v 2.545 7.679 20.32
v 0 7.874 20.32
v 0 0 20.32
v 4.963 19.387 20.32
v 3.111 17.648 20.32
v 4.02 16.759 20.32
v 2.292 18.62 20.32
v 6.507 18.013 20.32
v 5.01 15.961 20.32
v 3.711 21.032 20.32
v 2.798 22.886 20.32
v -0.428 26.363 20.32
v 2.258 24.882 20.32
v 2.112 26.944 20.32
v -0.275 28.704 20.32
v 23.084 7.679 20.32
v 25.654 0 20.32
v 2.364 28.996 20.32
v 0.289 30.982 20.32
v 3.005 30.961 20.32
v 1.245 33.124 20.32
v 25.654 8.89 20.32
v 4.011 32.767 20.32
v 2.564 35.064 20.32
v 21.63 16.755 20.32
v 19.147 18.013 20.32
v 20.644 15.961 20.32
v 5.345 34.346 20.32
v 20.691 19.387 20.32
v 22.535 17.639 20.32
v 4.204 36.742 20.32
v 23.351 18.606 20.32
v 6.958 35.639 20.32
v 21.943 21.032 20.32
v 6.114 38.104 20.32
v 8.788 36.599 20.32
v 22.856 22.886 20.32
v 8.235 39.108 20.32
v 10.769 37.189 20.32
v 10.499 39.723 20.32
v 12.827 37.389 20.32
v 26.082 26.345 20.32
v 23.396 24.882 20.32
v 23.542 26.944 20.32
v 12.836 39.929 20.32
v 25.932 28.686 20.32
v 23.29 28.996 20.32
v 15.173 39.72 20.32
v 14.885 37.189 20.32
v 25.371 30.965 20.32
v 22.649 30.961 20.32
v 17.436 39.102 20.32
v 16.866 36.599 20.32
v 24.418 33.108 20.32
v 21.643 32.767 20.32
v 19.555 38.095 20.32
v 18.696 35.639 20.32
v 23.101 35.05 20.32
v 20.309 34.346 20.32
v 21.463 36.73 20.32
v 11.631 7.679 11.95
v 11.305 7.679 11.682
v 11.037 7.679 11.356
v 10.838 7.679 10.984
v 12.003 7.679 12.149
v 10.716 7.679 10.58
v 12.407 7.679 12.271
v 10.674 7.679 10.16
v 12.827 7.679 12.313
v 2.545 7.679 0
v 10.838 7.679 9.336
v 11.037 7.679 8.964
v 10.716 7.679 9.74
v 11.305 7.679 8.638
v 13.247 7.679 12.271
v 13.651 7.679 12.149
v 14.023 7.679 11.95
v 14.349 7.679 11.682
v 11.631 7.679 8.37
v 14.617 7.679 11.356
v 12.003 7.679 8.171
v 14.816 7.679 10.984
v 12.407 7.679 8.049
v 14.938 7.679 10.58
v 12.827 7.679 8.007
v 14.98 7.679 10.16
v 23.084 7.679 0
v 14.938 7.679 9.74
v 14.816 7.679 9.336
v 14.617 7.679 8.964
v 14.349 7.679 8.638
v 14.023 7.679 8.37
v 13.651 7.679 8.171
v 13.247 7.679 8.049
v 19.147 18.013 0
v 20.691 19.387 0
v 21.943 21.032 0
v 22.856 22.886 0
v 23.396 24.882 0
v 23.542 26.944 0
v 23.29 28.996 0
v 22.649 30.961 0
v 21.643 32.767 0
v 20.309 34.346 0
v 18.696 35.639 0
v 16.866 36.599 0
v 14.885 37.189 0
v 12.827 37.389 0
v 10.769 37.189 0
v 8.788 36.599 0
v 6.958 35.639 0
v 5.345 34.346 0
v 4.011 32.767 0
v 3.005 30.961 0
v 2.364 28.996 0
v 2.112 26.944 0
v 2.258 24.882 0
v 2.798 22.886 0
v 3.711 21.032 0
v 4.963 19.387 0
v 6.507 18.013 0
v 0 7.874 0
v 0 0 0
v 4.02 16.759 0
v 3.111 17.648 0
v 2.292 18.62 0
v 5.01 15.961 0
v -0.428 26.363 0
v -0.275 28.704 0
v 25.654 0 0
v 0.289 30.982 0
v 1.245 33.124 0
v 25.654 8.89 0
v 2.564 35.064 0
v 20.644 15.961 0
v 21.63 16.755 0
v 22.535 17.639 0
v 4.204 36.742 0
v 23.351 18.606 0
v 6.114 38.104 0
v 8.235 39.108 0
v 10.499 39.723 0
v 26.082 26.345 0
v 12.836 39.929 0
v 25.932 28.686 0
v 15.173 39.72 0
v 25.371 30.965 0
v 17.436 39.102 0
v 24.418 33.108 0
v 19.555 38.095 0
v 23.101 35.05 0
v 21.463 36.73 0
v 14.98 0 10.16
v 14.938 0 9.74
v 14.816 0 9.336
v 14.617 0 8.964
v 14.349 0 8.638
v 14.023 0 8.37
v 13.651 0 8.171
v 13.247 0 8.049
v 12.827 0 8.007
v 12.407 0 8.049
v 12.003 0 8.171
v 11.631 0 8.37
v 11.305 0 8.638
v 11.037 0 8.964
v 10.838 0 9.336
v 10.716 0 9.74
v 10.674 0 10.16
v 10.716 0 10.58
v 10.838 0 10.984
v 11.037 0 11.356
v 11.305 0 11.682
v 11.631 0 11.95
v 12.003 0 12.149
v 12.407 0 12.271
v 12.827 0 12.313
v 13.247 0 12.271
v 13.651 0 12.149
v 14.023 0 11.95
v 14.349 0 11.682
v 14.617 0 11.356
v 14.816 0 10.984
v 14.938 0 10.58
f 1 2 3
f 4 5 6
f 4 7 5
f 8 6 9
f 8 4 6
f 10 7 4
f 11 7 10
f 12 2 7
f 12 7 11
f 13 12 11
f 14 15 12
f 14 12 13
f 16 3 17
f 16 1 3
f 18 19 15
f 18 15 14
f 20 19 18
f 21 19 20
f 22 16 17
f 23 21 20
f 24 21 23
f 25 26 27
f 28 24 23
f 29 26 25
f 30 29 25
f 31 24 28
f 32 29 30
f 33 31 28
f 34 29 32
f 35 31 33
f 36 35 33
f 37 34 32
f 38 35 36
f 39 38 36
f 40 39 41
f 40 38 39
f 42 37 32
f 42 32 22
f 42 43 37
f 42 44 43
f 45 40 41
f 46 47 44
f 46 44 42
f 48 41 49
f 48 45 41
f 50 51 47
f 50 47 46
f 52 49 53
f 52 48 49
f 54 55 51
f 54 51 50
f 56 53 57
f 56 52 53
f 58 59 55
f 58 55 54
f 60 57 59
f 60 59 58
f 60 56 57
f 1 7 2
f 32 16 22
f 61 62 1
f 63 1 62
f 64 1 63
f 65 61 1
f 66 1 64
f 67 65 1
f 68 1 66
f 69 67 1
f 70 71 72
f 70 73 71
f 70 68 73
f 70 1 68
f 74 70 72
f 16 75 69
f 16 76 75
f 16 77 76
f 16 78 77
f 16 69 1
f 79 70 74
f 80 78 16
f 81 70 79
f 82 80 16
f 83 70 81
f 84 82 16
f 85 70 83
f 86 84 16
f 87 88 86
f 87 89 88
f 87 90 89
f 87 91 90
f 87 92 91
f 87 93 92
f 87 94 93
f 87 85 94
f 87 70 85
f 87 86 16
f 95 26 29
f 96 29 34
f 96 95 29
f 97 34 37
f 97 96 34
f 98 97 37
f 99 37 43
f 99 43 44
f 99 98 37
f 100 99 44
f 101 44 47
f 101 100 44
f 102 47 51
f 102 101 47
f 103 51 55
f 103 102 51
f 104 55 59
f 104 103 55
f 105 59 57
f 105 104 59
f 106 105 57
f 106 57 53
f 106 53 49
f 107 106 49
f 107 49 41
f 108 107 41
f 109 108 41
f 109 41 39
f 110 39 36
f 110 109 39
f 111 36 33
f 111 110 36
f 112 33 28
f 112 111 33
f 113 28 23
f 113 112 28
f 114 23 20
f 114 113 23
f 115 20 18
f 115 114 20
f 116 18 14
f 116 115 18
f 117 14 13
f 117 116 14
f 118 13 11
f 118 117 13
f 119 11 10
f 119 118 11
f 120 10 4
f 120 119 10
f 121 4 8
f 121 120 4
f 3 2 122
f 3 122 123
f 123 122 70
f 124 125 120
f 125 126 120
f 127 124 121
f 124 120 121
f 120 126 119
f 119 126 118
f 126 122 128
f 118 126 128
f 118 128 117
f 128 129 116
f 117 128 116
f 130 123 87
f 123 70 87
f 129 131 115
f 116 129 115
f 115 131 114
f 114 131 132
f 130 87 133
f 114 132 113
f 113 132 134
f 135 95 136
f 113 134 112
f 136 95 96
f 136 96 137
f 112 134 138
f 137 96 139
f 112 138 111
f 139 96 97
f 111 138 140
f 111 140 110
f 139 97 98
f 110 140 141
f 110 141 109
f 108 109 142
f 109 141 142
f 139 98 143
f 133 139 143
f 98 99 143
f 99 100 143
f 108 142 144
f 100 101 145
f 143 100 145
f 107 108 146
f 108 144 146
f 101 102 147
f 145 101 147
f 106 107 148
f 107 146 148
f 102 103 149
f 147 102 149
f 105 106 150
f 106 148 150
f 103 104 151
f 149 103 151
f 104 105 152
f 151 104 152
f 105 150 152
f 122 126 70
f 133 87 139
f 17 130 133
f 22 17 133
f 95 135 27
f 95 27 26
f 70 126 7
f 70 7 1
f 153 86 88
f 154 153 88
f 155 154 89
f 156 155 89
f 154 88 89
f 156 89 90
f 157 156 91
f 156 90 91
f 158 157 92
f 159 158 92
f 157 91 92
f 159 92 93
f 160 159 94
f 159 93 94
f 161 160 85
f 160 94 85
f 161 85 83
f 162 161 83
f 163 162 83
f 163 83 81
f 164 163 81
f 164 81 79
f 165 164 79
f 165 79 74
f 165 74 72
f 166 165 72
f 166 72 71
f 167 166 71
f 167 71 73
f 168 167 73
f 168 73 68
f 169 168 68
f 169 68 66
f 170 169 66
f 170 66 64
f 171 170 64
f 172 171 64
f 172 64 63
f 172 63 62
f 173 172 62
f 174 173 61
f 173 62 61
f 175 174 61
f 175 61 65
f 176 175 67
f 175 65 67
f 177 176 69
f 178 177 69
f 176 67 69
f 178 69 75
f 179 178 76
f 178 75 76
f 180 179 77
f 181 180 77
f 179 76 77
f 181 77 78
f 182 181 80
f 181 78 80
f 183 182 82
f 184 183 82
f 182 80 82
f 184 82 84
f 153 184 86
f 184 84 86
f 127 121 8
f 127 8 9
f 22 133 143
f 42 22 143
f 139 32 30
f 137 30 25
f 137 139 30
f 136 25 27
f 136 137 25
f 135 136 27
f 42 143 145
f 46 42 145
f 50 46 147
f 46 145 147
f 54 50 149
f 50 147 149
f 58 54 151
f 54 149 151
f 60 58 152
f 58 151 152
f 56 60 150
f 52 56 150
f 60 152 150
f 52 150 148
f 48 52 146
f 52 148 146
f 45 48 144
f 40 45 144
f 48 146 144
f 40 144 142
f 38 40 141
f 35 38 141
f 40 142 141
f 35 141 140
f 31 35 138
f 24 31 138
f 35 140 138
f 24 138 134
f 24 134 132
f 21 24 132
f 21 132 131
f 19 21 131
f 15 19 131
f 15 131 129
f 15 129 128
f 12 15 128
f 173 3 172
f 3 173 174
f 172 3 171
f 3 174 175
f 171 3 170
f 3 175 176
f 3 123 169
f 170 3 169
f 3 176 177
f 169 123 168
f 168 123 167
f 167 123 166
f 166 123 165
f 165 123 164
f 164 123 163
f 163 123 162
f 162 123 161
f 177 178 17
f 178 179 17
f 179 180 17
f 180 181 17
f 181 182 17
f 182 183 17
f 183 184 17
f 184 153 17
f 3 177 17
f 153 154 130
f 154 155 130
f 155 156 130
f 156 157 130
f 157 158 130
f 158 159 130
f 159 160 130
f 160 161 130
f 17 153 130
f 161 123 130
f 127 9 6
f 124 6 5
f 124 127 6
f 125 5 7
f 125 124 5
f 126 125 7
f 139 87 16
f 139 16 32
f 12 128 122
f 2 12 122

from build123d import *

# Parameters (mm, degrees)
BOSS_EXTRUDE1_DEPTH       = 20.32
F_8_CLEARANCE_HOLE1_D     = 4.3053
F_8_CLEARANCE_HOLE1_DEPTH = 7.679166788


with BuildPart() as part:
    # Sketch1 → Boss-Extrude1 (new body)
    with BuildSketch(Plane.XY):
        with BuildLine():
            Line((0, 0), (25.654, 0))
            Line((25.654, 0), (25.654, 8.89))
            Line((25.654, 8.89), (26.081819356, 26.345128821))
            ThreePointArc((26.081819356, 26.345128821), (12.835928023, 39.928796994), (-0.42824485, 26.362979796))
            Line((-0.42824485, 26.362979796), (0, 7.874))
            Line((0, 7.874), (0, 0))
        make_face()
        with BuildLine():
            Line((2.545194005, 7.679166788), (23.083560079, 7.679166788))
            Line((23.083560079, 7.679166788), (23.351364853, 18.605663581))
            ThreePointArc((23.351364853, 18.605663581), (22.092748432, 17.18624107), (20.64444443, 15.960969231))
            Line((20.64444443, 15.960969231), (19.146849712, 18.012507692))
            ThreePointArc((19.146849712, 18.012507692), (12.827, 37.3888), (6.507150288, 18.012507692))
            Line((6.507150288, 18.012507692), (5.00955557, 15.960969231))
            ThreePointArc((5.00955557, 15.960969231), (3.55486763, 17.192482458), (2.291784196, 18.619844386))
            Line((2.291784196, 18.619844386), (2.545194005, 7.679166788))
        make_face(mode=Mode.SUBTRACT)
    extrude(amount=BOSS_EXTRUDE1_DEPTH)

    # #8 Clearance Hole1
    with Locations(Plane(origin=(0, 0, 0), x_dir=(-1, 0, 0), z_dir=(0, -1, 0))):
        with Locations((-12.827, -10.16)):
            Hole(F_8_CLEARANCE_HOLE1_D / 2, depth=F_8_CLEARANCE_HOLE1_DEPTH)


solid = part.part
